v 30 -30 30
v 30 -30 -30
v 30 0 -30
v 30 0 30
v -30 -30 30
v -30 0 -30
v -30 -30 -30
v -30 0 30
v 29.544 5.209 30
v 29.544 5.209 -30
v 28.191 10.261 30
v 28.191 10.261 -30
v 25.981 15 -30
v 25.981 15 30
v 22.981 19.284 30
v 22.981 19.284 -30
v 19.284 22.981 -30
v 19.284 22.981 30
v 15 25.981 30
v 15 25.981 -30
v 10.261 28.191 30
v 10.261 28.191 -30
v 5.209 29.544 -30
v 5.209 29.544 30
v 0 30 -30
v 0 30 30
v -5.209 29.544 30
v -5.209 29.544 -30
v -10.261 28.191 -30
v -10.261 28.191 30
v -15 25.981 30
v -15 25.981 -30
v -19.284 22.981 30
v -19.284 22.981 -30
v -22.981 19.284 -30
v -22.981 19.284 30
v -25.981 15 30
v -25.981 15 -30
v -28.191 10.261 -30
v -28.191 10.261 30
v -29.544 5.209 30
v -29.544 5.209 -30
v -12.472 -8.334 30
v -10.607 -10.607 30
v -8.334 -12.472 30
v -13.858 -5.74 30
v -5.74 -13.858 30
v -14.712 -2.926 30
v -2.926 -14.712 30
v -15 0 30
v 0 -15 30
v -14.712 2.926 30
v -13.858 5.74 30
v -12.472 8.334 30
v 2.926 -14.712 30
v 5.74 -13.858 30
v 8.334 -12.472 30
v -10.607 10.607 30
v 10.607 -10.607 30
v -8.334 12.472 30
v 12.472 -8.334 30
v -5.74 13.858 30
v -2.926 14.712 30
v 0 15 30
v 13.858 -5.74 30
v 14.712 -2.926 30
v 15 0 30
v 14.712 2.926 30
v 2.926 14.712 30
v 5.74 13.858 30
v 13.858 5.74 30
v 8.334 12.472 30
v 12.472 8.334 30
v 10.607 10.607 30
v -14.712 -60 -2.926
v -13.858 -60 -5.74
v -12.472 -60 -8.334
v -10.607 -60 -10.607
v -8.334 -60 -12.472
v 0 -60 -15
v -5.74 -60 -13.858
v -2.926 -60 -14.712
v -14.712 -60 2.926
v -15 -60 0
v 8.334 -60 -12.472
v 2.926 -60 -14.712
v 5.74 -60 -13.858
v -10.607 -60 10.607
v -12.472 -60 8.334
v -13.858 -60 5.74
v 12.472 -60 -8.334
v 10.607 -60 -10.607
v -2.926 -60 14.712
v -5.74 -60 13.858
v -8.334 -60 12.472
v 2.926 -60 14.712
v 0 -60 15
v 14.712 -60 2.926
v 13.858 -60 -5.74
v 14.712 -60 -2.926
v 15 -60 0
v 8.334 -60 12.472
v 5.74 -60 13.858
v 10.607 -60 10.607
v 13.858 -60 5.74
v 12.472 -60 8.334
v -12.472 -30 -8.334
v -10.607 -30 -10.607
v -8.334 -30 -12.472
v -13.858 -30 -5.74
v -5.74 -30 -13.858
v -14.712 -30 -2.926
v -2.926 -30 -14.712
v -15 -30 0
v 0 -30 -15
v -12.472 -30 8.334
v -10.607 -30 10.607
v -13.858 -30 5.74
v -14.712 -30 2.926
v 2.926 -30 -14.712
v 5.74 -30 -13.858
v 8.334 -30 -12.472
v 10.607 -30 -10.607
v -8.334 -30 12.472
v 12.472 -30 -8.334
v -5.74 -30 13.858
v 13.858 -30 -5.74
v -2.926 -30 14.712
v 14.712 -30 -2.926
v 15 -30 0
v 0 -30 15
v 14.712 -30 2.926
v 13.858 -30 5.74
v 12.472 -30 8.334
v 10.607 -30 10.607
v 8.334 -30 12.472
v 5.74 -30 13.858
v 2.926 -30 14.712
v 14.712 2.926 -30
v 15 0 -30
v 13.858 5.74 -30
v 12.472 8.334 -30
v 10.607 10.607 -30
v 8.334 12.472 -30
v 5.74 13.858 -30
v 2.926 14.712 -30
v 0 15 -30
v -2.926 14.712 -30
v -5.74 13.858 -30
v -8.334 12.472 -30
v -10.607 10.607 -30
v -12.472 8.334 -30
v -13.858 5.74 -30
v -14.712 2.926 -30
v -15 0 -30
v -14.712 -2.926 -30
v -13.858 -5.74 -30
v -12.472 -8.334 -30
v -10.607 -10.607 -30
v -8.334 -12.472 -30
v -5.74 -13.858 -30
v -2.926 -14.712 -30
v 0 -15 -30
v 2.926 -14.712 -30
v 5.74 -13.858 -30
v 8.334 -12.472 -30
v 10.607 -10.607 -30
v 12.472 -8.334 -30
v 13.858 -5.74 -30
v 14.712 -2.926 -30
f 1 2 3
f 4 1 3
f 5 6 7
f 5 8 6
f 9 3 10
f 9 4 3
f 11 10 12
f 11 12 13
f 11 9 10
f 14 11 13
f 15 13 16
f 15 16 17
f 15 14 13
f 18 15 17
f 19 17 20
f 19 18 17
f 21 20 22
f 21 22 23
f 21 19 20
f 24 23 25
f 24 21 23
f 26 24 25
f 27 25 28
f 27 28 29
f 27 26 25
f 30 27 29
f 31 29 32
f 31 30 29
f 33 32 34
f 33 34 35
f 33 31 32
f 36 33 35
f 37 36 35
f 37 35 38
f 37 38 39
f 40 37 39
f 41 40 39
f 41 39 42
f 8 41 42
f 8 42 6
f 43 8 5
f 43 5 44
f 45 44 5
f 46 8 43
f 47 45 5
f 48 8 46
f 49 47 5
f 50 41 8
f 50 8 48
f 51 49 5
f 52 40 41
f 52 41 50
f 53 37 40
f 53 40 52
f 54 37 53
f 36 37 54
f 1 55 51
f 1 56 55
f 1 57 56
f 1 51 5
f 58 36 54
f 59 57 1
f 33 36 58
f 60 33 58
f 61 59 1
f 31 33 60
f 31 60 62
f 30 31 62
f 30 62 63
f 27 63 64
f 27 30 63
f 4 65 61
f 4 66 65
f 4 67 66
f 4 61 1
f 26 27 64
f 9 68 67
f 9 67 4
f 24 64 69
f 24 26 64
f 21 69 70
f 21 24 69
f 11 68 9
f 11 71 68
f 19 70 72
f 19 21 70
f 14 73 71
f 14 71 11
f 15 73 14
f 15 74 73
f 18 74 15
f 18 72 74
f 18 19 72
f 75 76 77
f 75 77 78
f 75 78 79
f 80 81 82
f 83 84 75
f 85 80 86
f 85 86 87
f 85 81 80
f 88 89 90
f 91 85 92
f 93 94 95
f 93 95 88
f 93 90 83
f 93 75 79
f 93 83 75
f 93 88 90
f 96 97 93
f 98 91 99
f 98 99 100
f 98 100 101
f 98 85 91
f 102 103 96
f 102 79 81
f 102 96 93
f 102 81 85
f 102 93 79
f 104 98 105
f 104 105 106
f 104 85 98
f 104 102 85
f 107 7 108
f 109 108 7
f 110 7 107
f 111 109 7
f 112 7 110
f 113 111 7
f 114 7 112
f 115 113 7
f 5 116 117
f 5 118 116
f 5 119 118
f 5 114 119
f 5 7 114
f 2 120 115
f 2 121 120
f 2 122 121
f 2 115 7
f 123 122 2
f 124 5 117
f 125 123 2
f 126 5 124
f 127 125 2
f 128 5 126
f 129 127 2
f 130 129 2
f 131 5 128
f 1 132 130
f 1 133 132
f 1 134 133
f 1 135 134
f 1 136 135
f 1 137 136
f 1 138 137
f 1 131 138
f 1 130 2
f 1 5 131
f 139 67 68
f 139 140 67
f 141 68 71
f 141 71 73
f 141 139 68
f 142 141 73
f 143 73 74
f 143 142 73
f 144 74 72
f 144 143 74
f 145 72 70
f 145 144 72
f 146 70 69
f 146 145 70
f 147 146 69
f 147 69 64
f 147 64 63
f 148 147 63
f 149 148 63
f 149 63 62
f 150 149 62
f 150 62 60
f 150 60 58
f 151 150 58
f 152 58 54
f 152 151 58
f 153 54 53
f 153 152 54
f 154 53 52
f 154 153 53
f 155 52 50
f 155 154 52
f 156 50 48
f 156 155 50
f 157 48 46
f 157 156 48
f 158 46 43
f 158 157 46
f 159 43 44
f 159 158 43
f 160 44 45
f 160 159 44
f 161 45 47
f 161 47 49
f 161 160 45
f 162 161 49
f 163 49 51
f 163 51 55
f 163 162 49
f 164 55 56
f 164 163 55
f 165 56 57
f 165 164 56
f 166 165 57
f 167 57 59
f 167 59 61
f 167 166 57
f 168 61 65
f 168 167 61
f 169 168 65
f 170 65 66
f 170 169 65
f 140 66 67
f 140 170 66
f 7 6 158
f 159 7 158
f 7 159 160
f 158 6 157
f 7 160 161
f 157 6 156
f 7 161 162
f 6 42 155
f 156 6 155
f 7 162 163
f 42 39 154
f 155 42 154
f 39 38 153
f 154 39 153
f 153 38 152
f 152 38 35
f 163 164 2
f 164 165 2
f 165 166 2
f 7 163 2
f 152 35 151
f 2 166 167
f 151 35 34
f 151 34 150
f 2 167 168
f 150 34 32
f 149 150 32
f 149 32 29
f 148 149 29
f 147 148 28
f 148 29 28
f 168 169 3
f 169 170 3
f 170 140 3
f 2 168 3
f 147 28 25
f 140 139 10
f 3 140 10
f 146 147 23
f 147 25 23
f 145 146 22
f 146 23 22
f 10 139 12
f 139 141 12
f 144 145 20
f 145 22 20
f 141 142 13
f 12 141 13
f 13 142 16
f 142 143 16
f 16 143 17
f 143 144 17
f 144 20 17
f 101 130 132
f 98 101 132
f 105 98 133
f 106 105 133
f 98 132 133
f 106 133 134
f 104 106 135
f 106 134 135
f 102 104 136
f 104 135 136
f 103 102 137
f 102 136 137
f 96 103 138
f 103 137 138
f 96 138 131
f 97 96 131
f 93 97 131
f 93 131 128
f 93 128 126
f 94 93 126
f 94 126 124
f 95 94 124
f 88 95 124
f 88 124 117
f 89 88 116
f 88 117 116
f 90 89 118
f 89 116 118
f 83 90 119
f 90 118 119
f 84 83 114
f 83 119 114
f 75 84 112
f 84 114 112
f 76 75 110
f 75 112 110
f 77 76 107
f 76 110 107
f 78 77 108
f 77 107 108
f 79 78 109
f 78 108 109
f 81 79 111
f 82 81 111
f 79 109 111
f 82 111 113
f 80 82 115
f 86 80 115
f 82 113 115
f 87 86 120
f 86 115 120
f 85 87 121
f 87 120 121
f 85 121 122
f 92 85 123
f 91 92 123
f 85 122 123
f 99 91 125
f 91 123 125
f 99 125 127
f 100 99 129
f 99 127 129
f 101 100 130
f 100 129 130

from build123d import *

# Parameters (mm, degrees)
SKETCH1_LINK5_R     = 15
BOSS_EXTRUDE1_DEPTH = 30
SKETCH2_LINK5_R     = 15
BOSS_EXTRUDE2_DEPTH = 30


with BuildPart() as part:
    # sketch1_link5 → Boss-Extrude1 (new body, symmetric)
    with BuildSketch(Plane.XY):
        with BuildLine():
            Line((-30, 0), (-30, -30))
            Line((-30, -30), (30, -30))
            Line((30, -30), (30, 0))
            ThreePointArc((30, 0), (0, 30), (-30, 0))
        make_face()
        Circle(SKETCH1_LINK5_R, mode=Mode.SUBTRACT)
    extrude(amount=BOSS_EXTRUDE1_DEPTH, both=True)

    # sketch2_link5 → Boss-Extrude2 (add)
    with BuildSketch(Plane.XZ.offset(30)):
        Circle(SKETCH2_LINK5_R)
    extrude(amount=BOSS_EXTRUDE2_DEPTH)


solid = part.part
